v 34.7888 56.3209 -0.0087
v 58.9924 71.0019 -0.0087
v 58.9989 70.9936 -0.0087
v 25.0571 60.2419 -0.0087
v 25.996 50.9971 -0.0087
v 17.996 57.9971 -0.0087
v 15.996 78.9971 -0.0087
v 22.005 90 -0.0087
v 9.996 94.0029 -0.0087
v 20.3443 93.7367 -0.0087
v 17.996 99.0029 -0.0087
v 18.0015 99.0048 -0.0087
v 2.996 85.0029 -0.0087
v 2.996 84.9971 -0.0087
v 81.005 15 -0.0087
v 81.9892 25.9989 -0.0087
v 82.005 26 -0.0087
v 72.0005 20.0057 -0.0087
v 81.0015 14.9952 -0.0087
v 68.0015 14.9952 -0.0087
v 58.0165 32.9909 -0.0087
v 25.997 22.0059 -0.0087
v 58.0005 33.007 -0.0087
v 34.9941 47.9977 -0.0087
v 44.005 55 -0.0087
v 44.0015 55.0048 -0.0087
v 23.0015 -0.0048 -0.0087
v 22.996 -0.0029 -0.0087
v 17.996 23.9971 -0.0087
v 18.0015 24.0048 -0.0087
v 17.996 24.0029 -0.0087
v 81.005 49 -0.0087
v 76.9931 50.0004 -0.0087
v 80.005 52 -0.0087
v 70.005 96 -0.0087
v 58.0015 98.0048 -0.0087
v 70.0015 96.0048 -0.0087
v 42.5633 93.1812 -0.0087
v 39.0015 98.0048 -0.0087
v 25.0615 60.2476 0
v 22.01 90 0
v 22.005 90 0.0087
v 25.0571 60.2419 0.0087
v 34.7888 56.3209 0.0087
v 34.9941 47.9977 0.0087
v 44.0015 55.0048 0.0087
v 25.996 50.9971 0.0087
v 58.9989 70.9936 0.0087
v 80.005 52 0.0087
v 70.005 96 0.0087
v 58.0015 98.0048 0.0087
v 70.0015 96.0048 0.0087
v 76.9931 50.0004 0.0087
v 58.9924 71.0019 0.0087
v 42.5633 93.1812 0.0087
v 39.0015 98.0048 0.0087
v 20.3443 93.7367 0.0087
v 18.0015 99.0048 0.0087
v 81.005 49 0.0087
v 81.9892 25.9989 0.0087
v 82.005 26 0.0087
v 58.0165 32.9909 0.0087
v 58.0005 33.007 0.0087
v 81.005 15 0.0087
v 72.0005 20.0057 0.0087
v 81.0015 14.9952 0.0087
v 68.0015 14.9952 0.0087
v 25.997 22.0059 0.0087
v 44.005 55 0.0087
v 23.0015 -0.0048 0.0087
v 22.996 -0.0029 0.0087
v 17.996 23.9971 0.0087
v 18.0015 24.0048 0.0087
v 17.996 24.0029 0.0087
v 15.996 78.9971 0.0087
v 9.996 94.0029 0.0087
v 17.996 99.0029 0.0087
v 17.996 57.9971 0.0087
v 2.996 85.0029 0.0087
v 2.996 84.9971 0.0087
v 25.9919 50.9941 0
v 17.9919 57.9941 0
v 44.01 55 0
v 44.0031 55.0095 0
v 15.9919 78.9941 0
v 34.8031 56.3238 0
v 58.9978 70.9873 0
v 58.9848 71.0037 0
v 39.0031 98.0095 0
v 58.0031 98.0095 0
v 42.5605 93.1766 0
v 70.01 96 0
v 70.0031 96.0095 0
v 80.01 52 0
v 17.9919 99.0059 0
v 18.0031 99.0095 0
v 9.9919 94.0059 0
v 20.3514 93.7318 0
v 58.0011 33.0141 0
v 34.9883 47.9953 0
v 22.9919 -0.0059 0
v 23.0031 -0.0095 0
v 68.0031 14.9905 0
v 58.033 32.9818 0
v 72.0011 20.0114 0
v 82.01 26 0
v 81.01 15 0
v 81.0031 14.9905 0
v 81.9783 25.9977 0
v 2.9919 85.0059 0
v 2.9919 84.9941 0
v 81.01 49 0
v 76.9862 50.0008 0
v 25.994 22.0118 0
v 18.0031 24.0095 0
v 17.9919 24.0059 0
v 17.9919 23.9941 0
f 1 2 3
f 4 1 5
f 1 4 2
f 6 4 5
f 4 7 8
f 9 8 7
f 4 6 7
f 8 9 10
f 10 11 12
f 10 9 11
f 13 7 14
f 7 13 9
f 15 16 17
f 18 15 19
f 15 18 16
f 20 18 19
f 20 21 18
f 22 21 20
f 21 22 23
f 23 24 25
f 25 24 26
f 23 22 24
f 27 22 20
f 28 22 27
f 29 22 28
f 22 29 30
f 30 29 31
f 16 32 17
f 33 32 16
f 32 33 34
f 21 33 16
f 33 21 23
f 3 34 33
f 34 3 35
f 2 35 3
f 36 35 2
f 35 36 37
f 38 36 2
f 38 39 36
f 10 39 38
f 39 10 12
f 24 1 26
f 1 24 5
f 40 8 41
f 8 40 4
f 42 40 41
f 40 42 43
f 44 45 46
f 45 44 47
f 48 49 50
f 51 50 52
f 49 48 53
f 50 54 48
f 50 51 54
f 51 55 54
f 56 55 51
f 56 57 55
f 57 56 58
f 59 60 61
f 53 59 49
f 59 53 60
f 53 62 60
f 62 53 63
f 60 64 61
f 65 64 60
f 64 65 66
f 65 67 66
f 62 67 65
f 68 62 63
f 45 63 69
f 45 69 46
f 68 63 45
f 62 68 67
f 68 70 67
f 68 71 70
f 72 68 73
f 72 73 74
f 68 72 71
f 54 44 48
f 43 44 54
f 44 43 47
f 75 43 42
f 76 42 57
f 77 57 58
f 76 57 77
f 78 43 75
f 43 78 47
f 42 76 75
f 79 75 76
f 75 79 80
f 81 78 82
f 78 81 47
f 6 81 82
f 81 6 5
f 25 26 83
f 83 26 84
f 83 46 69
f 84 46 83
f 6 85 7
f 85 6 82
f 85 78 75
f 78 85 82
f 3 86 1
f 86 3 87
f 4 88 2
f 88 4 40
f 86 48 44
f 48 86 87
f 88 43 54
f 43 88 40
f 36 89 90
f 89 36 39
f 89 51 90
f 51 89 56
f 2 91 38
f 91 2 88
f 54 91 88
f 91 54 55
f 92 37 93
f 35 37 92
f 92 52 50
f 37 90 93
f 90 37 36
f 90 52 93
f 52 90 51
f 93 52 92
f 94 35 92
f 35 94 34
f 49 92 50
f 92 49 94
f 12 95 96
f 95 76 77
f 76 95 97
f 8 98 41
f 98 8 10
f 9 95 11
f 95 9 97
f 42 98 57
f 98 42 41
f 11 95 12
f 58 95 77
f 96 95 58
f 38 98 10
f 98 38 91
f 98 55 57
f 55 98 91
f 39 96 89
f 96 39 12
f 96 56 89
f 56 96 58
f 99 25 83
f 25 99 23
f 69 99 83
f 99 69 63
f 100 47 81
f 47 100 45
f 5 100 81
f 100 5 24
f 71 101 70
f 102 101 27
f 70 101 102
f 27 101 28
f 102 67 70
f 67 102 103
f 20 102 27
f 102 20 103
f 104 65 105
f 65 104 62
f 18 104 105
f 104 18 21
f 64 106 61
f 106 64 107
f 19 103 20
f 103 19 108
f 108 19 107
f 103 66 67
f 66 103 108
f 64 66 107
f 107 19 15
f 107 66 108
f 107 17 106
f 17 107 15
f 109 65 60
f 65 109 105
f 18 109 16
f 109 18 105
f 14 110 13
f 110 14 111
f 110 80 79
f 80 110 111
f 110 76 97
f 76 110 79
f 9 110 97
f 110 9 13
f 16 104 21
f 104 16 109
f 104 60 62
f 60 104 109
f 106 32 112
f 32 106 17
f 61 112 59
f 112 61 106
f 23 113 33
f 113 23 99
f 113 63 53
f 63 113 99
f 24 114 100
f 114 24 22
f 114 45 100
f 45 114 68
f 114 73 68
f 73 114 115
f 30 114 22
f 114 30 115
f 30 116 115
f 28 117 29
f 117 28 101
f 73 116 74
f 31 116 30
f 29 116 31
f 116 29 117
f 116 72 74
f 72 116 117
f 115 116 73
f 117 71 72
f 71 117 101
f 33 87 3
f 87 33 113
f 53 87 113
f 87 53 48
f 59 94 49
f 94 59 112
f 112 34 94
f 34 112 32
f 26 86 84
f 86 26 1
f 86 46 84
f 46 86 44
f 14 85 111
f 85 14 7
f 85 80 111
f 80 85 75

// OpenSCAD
color([0.5839405385485582,0.4048698908705002,0.6877557316706271]) hull(){
    translate([18,58]) sphere(0.01);
    translate([22,90]) sphere(0.01);
    translate([26,51]) sphere(0.01);
}
color([0.29310936231965135,0.08456113000314536,0.6409271470126323]) hull(){
    translate([18,58]) sphere(0.01);
    translate([22,90]) sphere(0.01);
    translate([20,83]) sphere(0.01);
}
color([0.38512246522478266,0.6162859510128613,0.407224705538046]) hull(){
    translate([18,58]) sphere(0.01);
    translate([44,55]) sphere(0.01);
    translate([44,47]) sphere(0.01);
}
color([0.6107800780239486,0.9541913078580654,0.09369719926319908]) hull(){
    translate([18,58]) sphere(0.01);
    translate([44,55]) sphere(0.01);
    translate([26,51]) sphere(0.01);
}
color([0.4396226851829427,0.9817497074141792,0.30111933510979894]) hull(){
    translate([18,58]) sphere(0.01);
    translate([26,51]) sphere(0.01);
    translate([30,57]) sphere(0.01);
}
color([0.08571041628526821,0.691130580335744,0.16573157374072334]) hull(){
    translate([18,58]) sphere(0.01);
    translate([26,51]) sphere(0.01);
    translate([16,79]) sphere(0.01);
}
color([0.4668304924867862,0.30100213617539295,0.3511677492745029]) hull(){
    translate([18,58]) sphere(0.01);
    translate([59,71]) sphere(0.01);
    translate([26,51]) sphere(0.01);
}
color([0.05564944269037686,0.7696481469448815,0.686275624239137]) hull(){
    translate([18,58]) sphere(0.01);
    translate([59,71]) sphere(0.01);
    translate([30,57]) sphere(0.01);
}
color([0.15447252119296884,0.35335085758162643,0.18799175914388588]) hull(){
    translate([18,58]) sphere(0.01);
    translate([20,83]) sphere(0.01);
    translate([16,79]) sphere(0.01);
}
color([0.41322879780265653,0.82270842281296,0.9057146612667819]) hull(){
    translate([18,58]) sphere(0.01);
    translate([16,79]) sphere(0.01);
    translate([22,90]) sphere(0.01);
}
color([0.9688547633127277,0.5528378273263655,0.12760284187612392]) hull(){
    translate([58,98]) sphere(0.01);
    translate([50,93]) sphere(0.01);
    translate([39,98]) sphere(0.01);
}
color([0.1710979555253146,0.7131998843266452,0.6397779425125977]) hull(){
    translate([58,98]) sphere(0.01);
    translate([50,93]) sphere(0.01);
    translate([59,71]) sphere(0.01);
}
color([0.57496968906483,0.8489371230716904,0.07944838941339594]) hull(){
    translate([58,98]) sphere(0.01);
    translate([39,98]) sphere(0.01);
    translate([59,71]) sphere(0.01);
}
color([0.040333123224873146,0.9305910632054132,0.3080440975445232]) hull(){
    translate([58,98]) sphere(0.01);
    translate([80,52]) sphere(0.01);
    translate([59,71]) sphere(0.01);
}
color([0.6084655882345898,0.4923441190446234,0.7069385087242315]) hull(){
    translate([58,98]) sphere(0.01);
    translate([59,71]) sphere(0.01);
    translate([70,96]) sphere(0.01);
}
color([0.6803385961846494,0.18024793645131376,0.10787678186317007]) hull(){
    translate([58,98]) sphere(0.01);
    translate([70,96]) sphere(0.01);
    translate([80,52]) sphere(0.01);
}
color([0.1335624130282893,0.47731112778056706,0.8393950916733898]) hull(){
    translate([22,90]) sphere(0.01);
    translate([10,94]) sphere(0.01);
    translate([20,83]) sphere(0.01);
}
color([0.6780893207968227,0.08337096158279222,0.27725115680544954]) hull(){
    translate([22,90]) sphere(0.01);
    translate([10,94]) sphere(0.01);
    translate([18,99]) sphere(0.01);
}
color([0.9965791662073833,0.03375154870506614,0.10494976972159242]) hull(){
    translate([22,90]) sphere(0.01);
    translate([20,83]) sphere(0.01);
    translate([18,99]) sphere(0.01);
}
color([0.516844917539197,0.1360610465034362,0.543805910213663]) hull(){
    translate([22,90]) sphere(0.01);
    translate([16,79]) sphere(0.01);
    translate([10,94]) sphere(0.01);
}
color([0.04901628196141694,0.4867102513994055,0.8813892002857401]) hull(){
    translate([50,93]) sphere(0.01);
    translate([10,94]) sphere(0.01);
    translate([39,98]) sphere(0.01);
}
color([0.3053751014353143,0.40772022041766365,0.31297204198076634]) hull(){
    translate([50,93]) sphere(0.01);
    translate([39,98]) sphere(0.01);
    translate([18,99]) sphere(0.01);
}
color([0.49907796034366436,0.6160709555012981,0.9916538905911245]) hull(){
    translate([50,93]) sphere(0.01);
    translate([18,99]) sphere(0.01);
    translate([10,94]) sphere(0.01);
}
color([0.3123575451593331,0.46364206475662195,0.8862899719975306]) hull(){
    translate([44,55]) sphere(0.01);
    translate([58,33]) sphere(0.01);
    translate([42,29]) sphere(0.01);
}
color([0.5738800220993816,0.8494037217359881,0.24323676398212035]) hull(){
    translate([44,55]) sphere(0.01);
    translate([58,33]) sphere(0.01);
    translate([44,47]) sphere(0.01);
}
color([0.8402878098664139,0.9530478541805099,0.16594803365564914]) hull(){
    translate([44,55]) sphere(0.01);
    translate([42,29]) sphere(0.01);
    translate([44,47]) sphere(0.01);
}
color([0.0023370868964924796,0.7387895340607371,0.5374530602666081]) hull(){
    translate([44,55]) sphere(0.01);
    translate([44,47]) sphere(0.01);
    translate([35,48]) sphere(0.01);
}
color([0.25604025835089217,0.4320068924153808,0.5112453323210508]) hull(){
    translate([44,55]) sphere(0.01);
    translate([35,48]) sphere(0.01);
    translate([26,51]) sphere(0.01);
}
color([0.7462272619347637,0.5039790716190428,0.8850839351693509]) hull(){
    translate([64,14]) sphere(0.01);
    translate([68,15]) sphere(0.01);
    translate([23,0]) sphere(0.01);
}
color([0.6652757233710683,0.22263754843686523,0.08942086350367451]) hull(){
    translate([64,14]) sphere(0.01);
    translate([58,33]) sphere(0.01);
    translate([42,29]) sphere(0.01);
}
color([0.6195232841458308,0.9036720387350747,0.7222923954673625]) hull(){
    translate([64,14]) sphere(0.01);
    translate([58,33]) sphere(0.01);
    translate([72,20]) sphere(0.01);
}
color([0.6665075097113882,0.5421139713900744,0.6943978877819516]) hull(){
    translate([64,14]) sphere(0.01);
    translate([42,29]) sphere(0.01);
    translate([26,22]) sphere(0.01);
}
color([0.9269770591996176,0.12480324665016229,0.8422397758241813]) hull(){
    translate([64,14]) sphere(0.01);
    translate([26,22]) sphere(0.01);
    translate([23,0]) sphere(0.01);
}
color([0.028249143050612435,0.8554899328562455,0.6212809598996976]) hull(){
    translate([64,14]) sphere(0.01);
    translate([72,20]) sphere(0.01);
    translate([68,15]) sphere(0.01);
}
color([0.6435486749275994,0.4857227915978113,0.2898251547629681]) hull(){
    translate([68,15]) sphere(0.01);
    translate([82,26]) sphere(0.01);
    translate([81,15]) sphere(0.01);
}
color([0.21709076393122206,0.4979948584580751,0.6176241526046676]) hull(){
    translate([68,15]) sphere(0.01);
    translate([82,26]) sphere(0.01);
    translate([72,20]) sphere(0.01);
}
color([0.4722249532281336,0.7228331534363125,0.6109414561657331]) hull(){
    translate([68,15]) sphere(0.01);
    translate([81,15]) sphere(0.01);
    translate([72,20]) sphere(0.01);
}
color([0.5330085163671737,0.6769359871291822,0.5973748769978083]) hull(){
    translate([10,94]) sphere(0.01);
    translate([6,84]) sphere(0.01);
    translate([20,83]) sphere(0.01);
}
color([0.14460255854654236,0.21273280877313017,0.8417179364881341]) hull(){
    translate([10,94]) sphere(0.01);
    translate([6,84]) sphere(0.01);
    translate([3,85]) sphere(0.01);
}
color([0.6300391880279899,0.5103677782275869,0.4479627161837708]) hull(){
    translate([10,94]) sphere(0.01);
    translate([20,83]) sphere(0.01);
    translate([6,84]) sphere(0.01);
}
color([0.2903518628620462,0.1744676713524972,0.5457372127765215]) hull(){
    translate([10,94]) sphere(0.01);
    translate([20,83]) sphere(0.01);
    translate([18,99]) sphere(0.01);
}
color([0.6340658375422632,0.7004271366493812,0.690956934786038]) hull(){
    translate([10,94]) sphere(0.01);
    translate([18,99]) sphere(0.01);
    translate([3,85]) sphere(0.01);
}
color([0.013948469234104865,0.8018456354370093,0.2607079205191076]) hull(){
    translate([58,33]) sphere(0.01);
    translate([82,26]) sphere(0.01);
    translate([80,52]) sphere(0.01);
}
color([0.01899716010339858,0.7507132946374245,0.44168653561511173]) hull(){
    translate([58,33]) sphere(0.01);
    translate([82,26]) sphere(0.01);
    translate([81,49]) sphere(0.01);
}
color([0.1668653701245908,0.45955837321901094,0.7876756969907556]) hull(){
    translate([58,33]) sphere(0.01);
    translate([80,52]) sphere(0.01);
    translate([77,50]) sphere(0.01);
}
color([0.09564527702692727,0.06733136152719421,0.7816649665975636]) hull(){
    translate([58,33]) sphere(0.01);
    translate([77,50]) sphere(0.01);
    translate([81,49]) sphere(0.01);
}
color([0.030385075649315252,0.33346286891595733,0.08647112242809318]) hull(){
    translate([42,29]) sphere(0.01);
    translate([26,22]) sphere(0.01);
    translate([44,47]) sphere(0.01);
}
color([0.8161439782233904,0.05657658467482607,0.8243668117903717]) hull(){
    translate([42,29]) sphere(0.01);
    translate([26,22]) sphere(0.01);
    translate([35,48]) sphere(0.01);
}
color([0.05808931884644186,0.6181904095369413,0.1426995958976538]) hull(){
    translate([42,29]) sphere(0.01);
    translate([44,47]) sphere(0.01);
    translate([35,48]) sphere(0.01);
}
color([0.3846464495954227,0.3794414211645075,0.7643773332264734]) hull(){
    translate([26,22]) sphere(0.01);
    translate([18,24]) sphere(0.01);
    translate([23,0]) sphere(0.01);
}
color([0.3116889002403487,0.7690158776827113,0.7674729074453902]) hull(){
    translate([26,22]) sphere(0.01);
    translate([18,24]) sphere(0.01);
    translate([24,21]) sphere(0.01);
}
color([0.3394448706328078,0.45855440081433096,0.0007502935671159783]) hull(){
    translate([26,22]) sphere(0.01);
    translate([23,0]) sphere(0.01);
    translate([24,21]) sphere(0.01);
}
color([0.8084995756647368,0.0331322283588068,0.9954935019736515]) hull(){
    translate([80,52]) sphere(0.01);
    translate([59,71]) sphere(0.01);
    translate([77,50]) sphere(0.01);
}
color([0.32750610520168044,0.511786711221762,0.09639677946248049]) hull(){
    translate([80,52]) sphere(0.01);
    translate([59,71]) sphere(0.01);
    translate([81,49]) sphere(0.01);
}
color([0.46647601470953737,0.043404226035316795,0.8089506697449751]) hull(){
    translate([80,52]) sphere(0.01);
    translate([77,50]) sphere(0.01);
    translate([81,49]) sphere(0.01);
}
color([0.9065579579370614,0.48874197586323487,0.4689182776921319]) hull(){
    translate([26,51]) sphere(0.01);
    translate([35,48]) sphere(0.01);
    translate([30,57]) sphere(0.01);
}
color([0.9999833648369341,0.42392948264922625,0.11056216143511133]) hull(){
    translate([26,51]) sphere(0.01);
    translate([30,57]) sphere(0.01);
    translate([44,55]) sphere(0.01);
}
color([0.5007484231317689,0.23725843071495933,0.7435751616565288]) hull(){
    translate([20,83]) sphere(0.01);
    translate([3,85]) sphere(0.01);
    translate([6,84]) sphere(0.01);
}
color([0.030326511183225713,0.9534383365251057,0.44454391677925087]) hull(){
    translate([20,83]) sphere(0.01);
    translate([3,85]) sphere(0.01);
    translate([16,79]) sphere(0.01);
}
color([0.4017260225039573,0.6984802625757133,0.14751428227125585]) hull(){
    translate([20,83]) sphere(0.01);
    translate([16,79]) sphere(0.01);
    translate([6,84]) sphere(0.01);
}
